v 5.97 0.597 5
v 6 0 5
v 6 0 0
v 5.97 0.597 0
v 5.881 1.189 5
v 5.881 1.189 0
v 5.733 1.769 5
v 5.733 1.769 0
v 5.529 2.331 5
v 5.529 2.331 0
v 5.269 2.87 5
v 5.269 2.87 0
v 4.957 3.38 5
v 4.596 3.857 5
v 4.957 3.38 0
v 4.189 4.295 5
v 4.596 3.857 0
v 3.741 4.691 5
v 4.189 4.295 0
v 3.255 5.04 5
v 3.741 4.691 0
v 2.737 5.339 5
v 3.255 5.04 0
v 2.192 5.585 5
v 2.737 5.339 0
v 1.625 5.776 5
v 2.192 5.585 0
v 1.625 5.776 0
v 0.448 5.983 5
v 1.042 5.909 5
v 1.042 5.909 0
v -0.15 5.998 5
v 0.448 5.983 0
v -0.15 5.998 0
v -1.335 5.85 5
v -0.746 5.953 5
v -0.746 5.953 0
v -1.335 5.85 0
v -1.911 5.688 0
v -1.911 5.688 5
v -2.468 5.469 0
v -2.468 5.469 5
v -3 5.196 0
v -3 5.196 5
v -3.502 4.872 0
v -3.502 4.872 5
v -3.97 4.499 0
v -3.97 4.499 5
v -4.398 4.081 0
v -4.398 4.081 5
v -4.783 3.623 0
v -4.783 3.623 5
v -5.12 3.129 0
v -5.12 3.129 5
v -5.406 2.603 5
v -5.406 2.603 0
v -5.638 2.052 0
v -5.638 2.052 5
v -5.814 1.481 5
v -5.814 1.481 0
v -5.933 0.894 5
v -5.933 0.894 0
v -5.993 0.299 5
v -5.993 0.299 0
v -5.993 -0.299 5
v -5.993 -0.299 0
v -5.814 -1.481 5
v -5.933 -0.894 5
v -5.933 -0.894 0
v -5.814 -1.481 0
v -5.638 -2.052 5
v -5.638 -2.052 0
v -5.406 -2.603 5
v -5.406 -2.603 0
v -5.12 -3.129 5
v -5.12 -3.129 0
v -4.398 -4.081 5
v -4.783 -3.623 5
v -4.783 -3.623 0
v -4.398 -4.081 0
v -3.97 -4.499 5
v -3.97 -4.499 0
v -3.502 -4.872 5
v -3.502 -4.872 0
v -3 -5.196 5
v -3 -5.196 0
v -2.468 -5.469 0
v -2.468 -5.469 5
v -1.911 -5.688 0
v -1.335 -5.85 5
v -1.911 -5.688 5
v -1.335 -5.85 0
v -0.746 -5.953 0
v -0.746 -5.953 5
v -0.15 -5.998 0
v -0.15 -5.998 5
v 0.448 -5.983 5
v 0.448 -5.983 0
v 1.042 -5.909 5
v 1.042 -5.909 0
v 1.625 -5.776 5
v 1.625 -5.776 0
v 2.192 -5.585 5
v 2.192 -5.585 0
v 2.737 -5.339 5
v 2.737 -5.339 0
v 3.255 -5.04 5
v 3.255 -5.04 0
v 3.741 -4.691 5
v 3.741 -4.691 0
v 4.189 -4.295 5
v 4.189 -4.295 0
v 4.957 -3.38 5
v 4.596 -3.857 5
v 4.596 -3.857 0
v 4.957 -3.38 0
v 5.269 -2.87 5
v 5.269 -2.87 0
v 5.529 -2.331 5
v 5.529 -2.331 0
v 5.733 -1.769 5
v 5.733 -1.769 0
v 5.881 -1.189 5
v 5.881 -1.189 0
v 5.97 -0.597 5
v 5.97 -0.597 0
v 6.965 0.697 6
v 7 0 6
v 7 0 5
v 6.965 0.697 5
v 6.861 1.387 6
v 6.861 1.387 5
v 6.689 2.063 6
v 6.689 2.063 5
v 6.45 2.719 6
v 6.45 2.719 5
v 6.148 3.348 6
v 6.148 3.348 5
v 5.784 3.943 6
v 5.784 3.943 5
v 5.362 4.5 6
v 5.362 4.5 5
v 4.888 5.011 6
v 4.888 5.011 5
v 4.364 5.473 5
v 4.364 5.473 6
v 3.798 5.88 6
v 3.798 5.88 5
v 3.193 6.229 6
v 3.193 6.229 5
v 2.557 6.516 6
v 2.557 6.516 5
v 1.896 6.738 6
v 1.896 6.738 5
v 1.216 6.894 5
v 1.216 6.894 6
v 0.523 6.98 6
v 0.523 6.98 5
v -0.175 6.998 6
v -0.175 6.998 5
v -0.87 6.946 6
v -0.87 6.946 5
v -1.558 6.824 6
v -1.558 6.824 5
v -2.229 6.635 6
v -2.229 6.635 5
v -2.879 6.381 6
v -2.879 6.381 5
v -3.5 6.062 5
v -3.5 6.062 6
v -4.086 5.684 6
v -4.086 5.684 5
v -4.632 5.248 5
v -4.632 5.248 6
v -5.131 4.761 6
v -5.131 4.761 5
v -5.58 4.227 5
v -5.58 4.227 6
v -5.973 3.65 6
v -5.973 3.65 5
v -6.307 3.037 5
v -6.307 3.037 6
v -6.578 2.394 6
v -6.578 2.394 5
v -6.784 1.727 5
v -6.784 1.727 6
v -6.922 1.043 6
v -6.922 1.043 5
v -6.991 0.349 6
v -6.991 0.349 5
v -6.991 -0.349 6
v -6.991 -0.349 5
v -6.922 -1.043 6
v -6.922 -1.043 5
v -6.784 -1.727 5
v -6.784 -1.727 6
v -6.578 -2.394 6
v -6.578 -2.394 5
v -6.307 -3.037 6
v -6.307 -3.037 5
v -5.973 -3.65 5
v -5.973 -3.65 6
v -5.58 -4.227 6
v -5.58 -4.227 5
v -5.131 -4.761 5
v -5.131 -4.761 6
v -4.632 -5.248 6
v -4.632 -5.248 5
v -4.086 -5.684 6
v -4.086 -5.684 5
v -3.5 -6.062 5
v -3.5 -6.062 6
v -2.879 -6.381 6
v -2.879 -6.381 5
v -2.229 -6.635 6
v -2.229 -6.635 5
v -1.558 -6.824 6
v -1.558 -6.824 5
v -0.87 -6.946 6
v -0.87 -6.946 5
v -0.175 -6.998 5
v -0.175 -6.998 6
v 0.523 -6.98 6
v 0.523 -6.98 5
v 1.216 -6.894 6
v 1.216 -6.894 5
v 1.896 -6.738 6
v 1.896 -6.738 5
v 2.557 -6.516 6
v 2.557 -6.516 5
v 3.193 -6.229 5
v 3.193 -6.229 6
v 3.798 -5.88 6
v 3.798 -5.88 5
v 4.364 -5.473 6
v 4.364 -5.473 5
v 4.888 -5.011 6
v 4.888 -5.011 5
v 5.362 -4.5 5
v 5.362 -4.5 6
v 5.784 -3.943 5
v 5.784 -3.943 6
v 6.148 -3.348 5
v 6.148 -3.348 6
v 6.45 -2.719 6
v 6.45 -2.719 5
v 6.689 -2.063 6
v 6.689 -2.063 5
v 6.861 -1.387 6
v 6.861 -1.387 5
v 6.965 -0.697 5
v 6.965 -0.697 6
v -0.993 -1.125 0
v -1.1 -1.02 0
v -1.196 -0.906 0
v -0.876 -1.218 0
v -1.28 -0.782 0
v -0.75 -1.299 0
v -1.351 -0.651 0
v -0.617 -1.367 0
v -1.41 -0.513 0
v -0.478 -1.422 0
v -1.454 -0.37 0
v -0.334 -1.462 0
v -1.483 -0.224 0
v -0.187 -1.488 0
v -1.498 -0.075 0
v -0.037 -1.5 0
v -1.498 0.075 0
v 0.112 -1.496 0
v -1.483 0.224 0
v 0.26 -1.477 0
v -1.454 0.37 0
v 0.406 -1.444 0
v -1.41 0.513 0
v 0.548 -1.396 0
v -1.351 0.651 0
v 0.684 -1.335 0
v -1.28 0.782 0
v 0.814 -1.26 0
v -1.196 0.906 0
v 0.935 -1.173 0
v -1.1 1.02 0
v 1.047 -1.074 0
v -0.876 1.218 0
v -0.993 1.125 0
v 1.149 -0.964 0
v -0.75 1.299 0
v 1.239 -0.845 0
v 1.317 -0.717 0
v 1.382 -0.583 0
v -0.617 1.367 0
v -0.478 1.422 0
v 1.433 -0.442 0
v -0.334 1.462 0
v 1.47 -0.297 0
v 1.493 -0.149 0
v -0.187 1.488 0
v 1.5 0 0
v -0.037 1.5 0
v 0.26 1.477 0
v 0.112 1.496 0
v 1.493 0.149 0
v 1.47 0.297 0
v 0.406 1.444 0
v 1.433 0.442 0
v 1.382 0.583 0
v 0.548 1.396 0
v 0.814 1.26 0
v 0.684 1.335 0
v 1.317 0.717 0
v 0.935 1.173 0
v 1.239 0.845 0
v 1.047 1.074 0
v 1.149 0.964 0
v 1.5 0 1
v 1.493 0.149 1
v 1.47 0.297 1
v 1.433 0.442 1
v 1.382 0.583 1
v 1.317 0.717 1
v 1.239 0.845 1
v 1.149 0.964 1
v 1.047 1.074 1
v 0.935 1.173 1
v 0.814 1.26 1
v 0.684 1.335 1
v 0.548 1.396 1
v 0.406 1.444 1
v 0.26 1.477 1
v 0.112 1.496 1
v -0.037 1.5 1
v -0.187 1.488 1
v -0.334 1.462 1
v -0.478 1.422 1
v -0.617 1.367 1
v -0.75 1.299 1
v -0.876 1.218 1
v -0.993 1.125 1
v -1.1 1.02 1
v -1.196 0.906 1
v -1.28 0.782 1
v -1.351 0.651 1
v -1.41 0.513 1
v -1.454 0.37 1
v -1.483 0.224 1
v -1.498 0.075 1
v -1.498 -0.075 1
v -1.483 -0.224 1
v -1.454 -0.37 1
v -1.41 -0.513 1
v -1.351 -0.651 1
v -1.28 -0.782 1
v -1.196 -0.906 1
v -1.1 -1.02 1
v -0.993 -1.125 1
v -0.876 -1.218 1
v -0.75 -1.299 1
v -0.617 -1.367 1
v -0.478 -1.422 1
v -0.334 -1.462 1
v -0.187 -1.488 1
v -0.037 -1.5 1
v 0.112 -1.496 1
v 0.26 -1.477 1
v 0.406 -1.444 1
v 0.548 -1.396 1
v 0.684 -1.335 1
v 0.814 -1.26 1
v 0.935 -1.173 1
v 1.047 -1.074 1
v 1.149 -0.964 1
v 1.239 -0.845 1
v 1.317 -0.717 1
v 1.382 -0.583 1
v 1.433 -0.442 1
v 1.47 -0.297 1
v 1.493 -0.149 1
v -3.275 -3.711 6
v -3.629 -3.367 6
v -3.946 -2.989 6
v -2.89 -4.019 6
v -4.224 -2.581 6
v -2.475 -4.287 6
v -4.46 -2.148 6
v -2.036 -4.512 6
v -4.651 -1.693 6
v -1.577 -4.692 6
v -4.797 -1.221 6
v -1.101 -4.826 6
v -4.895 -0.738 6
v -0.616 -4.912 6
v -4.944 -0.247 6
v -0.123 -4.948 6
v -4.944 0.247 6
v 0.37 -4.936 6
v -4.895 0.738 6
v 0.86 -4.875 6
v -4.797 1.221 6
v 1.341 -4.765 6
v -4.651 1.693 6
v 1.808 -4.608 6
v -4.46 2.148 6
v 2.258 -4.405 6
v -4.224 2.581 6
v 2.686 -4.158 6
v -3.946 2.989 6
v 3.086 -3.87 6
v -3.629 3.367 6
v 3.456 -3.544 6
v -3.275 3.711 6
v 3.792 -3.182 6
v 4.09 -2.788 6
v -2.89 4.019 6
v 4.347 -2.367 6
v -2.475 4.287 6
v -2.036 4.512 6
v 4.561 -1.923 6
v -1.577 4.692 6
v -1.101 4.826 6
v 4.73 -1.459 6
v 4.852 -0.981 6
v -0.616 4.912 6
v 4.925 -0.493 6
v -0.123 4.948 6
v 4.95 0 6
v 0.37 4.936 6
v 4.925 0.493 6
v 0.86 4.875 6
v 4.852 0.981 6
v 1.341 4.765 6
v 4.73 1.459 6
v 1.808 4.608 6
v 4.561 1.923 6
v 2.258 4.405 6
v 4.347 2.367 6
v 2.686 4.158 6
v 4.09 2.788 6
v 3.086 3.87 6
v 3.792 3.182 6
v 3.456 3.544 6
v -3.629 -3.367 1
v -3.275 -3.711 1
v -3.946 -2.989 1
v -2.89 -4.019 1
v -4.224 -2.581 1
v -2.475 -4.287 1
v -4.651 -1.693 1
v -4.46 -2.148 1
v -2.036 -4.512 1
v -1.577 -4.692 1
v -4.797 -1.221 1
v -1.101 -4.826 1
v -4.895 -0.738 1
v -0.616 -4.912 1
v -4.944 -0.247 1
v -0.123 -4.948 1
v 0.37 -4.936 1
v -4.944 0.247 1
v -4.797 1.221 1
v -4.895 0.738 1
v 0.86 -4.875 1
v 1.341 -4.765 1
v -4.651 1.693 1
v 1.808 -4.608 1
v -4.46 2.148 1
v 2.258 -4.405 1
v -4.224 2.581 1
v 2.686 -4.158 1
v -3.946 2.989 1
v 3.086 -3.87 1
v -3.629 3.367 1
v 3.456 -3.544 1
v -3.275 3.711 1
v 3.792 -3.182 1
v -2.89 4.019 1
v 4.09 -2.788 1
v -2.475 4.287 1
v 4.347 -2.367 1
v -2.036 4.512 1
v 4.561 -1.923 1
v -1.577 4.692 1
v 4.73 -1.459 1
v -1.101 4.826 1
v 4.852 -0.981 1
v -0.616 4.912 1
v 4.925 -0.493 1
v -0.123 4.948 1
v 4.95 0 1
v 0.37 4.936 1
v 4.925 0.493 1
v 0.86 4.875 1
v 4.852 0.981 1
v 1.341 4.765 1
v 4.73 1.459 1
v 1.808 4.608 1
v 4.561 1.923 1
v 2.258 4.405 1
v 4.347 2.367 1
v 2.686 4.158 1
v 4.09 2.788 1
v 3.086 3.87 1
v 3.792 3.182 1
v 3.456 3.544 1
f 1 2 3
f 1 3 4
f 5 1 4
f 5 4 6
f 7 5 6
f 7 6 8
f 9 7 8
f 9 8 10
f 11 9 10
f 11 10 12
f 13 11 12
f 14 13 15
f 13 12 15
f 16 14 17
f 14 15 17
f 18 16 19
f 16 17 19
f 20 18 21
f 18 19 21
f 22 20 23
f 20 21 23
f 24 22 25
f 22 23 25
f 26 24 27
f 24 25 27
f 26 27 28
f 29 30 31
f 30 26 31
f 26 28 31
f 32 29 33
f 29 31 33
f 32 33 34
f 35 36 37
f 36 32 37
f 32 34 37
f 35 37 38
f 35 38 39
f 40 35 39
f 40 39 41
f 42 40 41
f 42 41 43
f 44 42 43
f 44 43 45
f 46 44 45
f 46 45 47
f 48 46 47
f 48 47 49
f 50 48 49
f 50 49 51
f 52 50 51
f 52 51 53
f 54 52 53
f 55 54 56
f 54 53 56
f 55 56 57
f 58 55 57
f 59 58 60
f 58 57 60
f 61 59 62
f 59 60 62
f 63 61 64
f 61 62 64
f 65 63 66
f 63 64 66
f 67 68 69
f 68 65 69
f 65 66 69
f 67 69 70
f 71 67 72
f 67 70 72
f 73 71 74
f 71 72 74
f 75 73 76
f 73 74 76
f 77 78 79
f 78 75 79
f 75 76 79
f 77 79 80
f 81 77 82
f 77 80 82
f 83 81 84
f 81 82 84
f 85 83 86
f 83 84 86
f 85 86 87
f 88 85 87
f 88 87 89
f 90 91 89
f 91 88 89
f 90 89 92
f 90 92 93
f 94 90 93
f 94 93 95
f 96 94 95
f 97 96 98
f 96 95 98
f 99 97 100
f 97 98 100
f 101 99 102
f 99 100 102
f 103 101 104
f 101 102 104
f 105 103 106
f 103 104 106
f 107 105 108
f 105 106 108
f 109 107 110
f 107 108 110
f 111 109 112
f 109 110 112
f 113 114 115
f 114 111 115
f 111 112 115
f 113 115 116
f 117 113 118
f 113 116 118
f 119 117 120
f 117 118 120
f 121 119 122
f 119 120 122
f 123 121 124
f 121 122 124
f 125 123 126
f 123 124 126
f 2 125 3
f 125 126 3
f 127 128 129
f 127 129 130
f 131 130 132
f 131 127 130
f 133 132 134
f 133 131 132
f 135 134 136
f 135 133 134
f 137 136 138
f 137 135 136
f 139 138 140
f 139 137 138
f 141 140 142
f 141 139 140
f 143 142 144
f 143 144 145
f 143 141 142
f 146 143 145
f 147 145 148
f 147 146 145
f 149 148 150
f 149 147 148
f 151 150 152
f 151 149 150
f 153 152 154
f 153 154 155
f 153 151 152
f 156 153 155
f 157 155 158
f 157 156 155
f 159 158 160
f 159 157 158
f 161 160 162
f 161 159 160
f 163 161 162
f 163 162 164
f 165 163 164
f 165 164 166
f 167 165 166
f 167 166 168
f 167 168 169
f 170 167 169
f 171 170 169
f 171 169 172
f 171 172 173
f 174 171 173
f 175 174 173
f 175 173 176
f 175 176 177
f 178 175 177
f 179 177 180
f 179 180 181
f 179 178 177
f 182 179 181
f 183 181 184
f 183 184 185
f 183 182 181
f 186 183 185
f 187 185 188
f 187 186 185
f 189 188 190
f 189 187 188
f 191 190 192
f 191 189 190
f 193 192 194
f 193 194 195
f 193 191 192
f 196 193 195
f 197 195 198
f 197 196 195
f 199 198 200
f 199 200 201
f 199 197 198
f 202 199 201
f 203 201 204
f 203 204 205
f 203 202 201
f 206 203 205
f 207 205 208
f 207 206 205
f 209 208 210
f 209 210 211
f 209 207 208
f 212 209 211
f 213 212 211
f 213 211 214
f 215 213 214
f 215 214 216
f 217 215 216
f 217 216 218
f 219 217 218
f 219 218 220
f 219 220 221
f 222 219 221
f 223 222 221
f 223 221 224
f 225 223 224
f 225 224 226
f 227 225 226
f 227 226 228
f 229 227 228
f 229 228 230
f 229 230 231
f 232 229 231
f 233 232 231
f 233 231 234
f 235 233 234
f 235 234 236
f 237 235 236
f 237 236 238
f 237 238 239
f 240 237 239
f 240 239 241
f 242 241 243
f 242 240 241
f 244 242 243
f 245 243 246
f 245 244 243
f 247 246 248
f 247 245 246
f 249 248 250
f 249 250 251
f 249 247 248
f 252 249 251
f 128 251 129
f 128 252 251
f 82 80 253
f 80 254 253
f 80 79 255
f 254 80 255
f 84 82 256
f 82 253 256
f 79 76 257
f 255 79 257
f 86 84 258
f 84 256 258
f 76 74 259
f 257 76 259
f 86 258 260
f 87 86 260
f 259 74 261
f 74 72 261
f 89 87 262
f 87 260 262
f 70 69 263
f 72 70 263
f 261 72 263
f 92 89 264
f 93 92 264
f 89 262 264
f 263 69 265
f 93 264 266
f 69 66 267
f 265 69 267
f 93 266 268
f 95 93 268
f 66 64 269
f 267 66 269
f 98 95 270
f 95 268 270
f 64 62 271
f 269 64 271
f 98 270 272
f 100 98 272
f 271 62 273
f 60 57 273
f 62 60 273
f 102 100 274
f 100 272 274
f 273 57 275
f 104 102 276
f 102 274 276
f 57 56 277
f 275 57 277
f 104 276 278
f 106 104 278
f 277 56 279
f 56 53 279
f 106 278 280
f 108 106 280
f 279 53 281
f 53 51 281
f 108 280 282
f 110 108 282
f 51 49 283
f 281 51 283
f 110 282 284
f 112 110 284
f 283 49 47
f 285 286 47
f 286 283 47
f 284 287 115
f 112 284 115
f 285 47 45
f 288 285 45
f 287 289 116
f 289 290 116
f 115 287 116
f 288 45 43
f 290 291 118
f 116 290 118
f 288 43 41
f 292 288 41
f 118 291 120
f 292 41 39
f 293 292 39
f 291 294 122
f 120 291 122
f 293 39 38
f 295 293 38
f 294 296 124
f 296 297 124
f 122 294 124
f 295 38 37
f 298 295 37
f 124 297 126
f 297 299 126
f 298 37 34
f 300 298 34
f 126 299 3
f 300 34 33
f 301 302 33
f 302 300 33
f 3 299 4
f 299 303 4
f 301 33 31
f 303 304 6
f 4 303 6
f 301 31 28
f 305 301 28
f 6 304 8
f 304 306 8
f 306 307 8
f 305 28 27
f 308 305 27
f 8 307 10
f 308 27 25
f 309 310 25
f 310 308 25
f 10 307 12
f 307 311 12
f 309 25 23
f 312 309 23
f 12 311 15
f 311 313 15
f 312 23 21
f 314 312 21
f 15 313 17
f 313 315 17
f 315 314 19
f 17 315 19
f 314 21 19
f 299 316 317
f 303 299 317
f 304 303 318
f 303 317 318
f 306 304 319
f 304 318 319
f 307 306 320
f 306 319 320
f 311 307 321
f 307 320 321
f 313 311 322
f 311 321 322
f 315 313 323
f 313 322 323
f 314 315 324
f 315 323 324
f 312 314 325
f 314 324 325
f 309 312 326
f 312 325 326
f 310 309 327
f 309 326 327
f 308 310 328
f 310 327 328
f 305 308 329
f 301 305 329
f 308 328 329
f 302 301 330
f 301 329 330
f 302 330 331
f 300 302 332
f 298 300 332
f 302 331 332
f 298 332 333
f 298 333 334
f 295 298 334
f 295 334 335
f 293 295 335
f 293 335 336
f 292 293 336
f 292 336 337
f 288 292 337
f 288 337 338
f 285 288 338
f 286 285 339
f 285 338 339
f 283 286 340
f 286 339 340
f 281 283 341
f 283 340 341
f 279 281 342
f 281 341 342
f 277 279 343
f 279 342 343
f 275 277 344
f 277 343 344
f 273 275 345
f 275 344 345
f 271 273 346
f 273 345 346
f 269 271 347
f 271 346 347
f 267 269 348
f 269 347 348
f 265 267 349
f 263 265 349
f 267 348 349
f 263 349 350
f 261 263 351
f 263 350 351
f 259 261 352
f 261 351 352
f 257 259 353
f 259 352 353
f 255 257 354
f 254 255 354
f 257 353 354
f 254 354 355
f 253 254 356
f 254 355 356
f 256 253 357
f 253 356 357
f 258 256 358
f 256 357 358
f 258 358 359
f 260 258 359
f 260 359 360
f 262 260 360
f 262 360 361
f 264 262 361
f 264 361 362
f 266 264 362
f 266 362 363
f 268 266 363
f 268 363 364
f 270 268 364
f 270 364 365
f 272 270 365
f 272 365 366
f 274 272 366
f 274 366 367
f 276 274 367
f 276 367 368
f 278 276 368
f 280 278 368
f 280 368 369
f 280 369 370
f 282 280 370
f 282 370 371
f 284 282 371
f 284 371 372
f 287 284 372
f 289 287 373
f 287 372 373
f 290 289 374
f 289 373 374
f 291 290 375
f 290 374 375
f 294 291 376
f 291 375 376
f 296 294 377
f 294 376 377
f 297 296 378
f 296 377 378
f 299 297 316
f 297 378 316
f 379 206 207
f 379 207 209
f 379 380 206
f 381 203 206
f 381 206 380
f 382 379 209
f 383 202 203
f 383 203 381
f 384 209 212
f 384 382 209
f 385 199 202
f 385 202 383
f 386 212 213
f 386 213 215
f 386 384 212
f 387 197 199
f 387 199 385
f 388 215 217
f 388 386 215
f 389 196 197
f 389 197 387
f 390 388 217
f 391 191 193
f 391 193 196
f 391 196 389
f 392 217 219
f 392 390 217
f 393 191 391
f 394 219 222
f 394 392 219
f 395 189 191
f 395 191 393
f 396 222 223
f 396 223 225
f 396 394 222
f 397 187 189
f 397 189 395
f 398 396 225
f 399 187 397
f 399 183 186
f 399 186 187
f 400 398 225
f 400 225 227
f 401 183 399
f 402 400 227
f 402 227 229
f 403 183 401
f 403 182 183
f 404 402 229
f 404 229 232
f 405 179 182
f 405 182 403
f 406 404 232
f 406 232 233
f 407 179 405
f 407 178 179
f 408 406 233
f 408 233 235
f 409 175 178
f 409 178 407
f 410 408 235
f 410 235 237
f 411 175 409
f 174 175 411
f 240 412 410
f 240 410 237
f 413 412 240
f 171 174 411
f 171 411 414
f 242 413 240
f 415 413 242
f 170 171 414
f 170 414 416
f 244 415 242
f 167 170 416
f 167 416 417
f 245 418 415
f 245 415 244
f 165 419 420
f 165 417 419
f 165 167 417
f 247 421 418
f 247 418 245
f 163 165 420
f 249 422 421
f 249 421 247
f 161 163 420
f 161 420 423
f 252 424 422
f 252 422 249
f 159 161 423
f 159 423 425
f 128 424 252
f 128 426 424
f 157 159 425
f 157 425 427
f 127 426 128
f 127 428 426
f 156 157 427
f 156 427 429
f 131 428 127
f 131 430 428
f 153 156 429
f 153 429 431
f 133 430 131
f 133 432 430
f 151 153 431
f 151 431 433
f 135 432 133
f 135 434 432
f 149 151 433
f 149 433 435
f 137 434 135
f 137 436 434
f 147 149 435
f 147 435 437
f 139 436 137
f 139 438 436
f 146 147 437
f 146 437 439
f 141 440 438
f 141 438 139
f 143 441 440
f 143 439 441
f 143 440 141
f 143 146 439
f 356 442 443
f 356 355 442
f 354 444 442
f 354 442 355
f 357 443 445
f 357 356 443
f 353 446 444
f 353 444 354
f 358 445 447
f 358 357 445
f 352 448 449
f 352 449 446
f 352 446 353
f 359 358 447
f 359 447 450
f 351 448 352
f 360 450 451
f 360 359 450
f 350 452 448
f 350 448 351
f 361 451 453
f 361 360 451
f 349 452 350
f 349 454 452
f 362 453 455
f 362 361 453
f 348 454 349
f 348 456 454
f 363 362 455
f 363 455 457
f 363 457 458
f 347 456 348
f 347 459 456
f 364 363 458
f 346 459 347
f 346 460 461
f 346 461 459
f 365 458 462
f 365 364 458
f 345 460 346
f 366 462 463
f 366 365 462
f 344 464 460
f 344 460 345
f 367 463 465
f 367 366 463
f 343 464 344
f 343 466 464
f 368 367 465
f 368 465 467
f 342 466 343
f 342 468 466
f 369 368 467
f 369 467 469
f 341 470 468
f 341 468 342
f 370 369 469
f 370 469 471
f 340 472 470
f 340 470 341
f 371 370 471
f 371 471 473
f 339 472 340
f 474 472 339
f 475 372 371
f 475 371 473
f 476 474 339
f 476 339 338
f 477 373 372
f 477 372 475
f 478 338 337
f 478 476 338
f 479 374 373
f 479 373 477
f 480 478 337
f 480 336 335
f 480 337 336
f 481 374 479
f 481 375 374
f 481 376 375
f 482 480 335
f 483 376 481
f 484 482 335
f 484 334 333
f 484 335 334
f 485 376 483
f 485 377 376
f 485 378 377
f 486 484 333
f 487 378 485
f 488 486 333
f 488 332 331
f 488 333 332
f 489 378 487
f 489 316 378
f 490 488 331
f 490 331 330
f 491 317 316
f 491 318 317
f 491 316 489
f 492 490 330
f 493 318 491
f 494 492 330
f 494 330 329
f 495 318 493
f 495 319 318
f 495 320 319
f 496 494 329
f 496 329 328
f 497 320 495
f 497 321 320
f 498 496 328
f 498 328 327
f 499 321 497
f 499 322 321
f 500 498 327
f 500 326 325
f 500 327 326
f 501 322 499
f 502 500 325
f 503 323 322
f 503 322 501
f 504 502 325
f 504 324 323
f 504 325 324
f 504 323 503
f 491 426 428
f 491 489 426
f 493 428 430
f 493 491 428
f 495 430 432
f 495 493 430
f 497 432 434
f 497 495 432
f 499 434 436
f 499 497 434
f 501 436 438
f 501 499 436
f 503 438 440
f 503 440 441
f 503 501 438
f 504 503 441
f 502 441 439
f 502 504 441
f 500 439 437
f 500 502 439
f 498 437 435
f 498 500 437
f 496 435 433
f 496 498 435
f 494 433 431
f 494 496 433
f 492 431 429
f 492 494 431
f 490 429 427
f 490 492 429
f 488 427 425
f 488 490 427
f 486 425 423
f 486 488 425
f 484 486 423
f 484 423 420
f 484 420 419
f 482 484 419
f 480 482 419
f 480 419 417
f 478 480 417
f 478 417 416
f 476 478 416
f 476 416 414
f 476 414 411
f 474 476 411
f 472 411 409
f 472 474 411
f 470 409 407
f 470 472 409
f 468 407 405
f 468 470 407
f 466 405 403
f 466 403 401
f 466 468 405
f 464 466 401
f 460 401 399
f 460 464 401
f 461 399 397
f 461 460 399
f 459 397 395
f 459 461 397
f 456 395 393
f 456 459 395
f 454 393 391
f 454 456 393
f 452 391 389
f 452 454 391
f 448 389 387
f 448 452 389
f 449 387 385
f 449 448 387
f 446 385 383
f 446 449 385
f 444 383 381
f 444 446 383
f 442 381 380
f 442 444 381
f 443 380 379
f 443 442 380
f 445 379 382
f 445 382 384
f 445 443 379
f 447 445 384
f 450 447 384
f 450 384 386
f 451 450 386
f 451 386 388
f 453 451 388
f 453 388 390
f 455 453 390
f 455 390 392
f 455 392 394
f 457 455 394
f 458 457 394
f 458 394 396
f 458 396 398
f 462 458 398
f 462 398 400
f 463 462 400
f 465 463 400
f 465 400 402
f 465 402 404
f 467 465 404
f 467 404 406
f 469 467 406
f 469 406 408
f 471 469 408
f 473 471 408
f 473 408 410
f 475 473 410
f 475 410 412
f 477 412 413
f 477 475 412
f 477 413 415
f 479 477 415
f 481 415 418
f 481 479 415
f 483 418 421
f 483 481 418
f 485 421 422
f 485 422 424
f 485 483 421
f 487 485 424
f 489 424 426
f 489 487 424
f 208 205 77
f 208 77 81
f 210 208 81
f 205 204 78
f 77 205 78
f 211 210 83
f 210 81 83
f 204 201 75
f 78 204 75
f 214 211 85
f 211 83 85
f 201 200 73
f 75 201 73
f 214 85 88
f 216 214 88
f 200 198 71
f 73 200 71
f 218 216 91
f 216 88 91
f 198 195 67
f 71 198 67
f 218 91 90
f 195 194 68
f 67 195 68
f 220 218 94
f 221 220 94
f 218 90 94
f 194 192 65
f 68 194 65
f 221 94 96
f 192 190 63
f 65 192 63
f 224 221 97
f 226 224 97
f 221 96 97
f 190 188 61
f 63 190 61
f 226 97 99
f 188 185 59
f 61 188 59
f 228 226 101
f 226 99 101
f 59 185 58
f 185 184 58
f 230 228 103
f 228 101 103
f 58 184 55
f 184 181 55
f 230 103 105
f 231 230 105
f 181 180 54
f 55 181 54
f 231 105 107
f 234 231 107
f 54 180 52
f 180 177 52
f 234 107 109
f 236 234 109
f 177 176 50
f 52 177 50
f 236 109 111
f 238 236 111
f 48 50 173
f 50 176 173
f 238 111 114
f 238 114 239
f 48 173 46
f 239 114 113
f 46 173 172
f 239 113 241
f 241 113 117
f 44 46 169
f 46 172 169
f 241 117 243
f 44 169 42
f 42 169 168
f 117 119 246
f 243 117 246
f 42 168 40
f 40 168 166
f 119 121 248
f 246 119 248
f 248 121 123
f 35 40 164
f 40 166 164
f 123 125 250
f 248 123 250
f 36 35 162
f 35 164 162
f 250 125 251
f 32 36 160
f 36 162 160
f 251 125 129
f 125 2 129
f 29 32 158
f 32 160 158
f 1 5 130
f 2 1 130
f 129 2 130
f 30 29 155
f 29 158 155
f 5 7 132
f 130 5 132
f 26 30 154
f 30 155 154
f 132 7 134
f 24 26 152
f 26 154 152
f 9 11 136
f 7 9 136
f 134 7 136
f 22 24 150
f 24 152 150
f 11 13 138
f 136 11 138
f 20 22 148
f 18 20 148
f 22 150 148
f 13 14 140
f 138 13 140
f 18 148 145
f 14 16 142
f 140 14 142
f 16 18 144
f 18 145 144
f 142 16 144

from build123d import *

# Parameters (mm, degrees)
SKETCH_1_R          = 6
EXTRUDE_1_DEPTH     = 1
SKETCH_2_R          = 6
SKETCH_2_R_2        = 4.95
EXTRUDE_2_DEPTH     = 5
SKETCH_3_R          = 7
EXTRUDE_3_DEPTH     = 1
CUT_EXTRUDE_START   = -5
SKETCH_5_R          = 4.95
CUT_EXTRUDE_1_DEPTH = 5
SKETCH_6_R          = 1.5
CUT_EXTRUDE_2_DEPTH = 1


with BuildPart() as part:
    # Эскиз1 → Бобышка-Вытянуть1 (new body)
    with BuildSketch(Plane.XY):
        Circle(SKETCH_1_R)
    extrude(amount=EXTRUDE_1_DEPTH)

    # Эскиз2 → Бобышка-Вытянуть2 (add)
    with BuildSketch(Plane.XY.offset(1)):
        Circle(SKETCH_2_R)
        Circle(SKETCH_2_R_2, mode=Mode.SUBTRACT)
    extrude(amount=EXTRUDE_2_DEPTH)

    # Эскиз3 → Бобышка-Вытянуть3 (add)
    with BuildSketch(Plane.XY.offset(6)):
        Circle(SKETCH_3_R)
    extrude(amount=-EXTRUDE_3_DEPTH)

    # Эскиз5 → Вырез-Вытянуть1 (cut)
    with BuildSketch(Plane.XY.offset(6).offset(CUT_EXTRUDE_START)):
        Circle(SKETCH_5_R)
    extrude(amount=CUT_EXTRUDE_1_DEPTH, mode=Mode.SUBTRACT)

    # Эскиз6 → Вырез-Вытянуть2 (cut)
    with BuildSketch(Plane.XY.offset(1)):
        Circle(SKETCH_6_R)
    extrude(amount=-CUT_EXTRUDE_2_DEPTH, mode=Mode.SUBTRACT)


solid = part.part
